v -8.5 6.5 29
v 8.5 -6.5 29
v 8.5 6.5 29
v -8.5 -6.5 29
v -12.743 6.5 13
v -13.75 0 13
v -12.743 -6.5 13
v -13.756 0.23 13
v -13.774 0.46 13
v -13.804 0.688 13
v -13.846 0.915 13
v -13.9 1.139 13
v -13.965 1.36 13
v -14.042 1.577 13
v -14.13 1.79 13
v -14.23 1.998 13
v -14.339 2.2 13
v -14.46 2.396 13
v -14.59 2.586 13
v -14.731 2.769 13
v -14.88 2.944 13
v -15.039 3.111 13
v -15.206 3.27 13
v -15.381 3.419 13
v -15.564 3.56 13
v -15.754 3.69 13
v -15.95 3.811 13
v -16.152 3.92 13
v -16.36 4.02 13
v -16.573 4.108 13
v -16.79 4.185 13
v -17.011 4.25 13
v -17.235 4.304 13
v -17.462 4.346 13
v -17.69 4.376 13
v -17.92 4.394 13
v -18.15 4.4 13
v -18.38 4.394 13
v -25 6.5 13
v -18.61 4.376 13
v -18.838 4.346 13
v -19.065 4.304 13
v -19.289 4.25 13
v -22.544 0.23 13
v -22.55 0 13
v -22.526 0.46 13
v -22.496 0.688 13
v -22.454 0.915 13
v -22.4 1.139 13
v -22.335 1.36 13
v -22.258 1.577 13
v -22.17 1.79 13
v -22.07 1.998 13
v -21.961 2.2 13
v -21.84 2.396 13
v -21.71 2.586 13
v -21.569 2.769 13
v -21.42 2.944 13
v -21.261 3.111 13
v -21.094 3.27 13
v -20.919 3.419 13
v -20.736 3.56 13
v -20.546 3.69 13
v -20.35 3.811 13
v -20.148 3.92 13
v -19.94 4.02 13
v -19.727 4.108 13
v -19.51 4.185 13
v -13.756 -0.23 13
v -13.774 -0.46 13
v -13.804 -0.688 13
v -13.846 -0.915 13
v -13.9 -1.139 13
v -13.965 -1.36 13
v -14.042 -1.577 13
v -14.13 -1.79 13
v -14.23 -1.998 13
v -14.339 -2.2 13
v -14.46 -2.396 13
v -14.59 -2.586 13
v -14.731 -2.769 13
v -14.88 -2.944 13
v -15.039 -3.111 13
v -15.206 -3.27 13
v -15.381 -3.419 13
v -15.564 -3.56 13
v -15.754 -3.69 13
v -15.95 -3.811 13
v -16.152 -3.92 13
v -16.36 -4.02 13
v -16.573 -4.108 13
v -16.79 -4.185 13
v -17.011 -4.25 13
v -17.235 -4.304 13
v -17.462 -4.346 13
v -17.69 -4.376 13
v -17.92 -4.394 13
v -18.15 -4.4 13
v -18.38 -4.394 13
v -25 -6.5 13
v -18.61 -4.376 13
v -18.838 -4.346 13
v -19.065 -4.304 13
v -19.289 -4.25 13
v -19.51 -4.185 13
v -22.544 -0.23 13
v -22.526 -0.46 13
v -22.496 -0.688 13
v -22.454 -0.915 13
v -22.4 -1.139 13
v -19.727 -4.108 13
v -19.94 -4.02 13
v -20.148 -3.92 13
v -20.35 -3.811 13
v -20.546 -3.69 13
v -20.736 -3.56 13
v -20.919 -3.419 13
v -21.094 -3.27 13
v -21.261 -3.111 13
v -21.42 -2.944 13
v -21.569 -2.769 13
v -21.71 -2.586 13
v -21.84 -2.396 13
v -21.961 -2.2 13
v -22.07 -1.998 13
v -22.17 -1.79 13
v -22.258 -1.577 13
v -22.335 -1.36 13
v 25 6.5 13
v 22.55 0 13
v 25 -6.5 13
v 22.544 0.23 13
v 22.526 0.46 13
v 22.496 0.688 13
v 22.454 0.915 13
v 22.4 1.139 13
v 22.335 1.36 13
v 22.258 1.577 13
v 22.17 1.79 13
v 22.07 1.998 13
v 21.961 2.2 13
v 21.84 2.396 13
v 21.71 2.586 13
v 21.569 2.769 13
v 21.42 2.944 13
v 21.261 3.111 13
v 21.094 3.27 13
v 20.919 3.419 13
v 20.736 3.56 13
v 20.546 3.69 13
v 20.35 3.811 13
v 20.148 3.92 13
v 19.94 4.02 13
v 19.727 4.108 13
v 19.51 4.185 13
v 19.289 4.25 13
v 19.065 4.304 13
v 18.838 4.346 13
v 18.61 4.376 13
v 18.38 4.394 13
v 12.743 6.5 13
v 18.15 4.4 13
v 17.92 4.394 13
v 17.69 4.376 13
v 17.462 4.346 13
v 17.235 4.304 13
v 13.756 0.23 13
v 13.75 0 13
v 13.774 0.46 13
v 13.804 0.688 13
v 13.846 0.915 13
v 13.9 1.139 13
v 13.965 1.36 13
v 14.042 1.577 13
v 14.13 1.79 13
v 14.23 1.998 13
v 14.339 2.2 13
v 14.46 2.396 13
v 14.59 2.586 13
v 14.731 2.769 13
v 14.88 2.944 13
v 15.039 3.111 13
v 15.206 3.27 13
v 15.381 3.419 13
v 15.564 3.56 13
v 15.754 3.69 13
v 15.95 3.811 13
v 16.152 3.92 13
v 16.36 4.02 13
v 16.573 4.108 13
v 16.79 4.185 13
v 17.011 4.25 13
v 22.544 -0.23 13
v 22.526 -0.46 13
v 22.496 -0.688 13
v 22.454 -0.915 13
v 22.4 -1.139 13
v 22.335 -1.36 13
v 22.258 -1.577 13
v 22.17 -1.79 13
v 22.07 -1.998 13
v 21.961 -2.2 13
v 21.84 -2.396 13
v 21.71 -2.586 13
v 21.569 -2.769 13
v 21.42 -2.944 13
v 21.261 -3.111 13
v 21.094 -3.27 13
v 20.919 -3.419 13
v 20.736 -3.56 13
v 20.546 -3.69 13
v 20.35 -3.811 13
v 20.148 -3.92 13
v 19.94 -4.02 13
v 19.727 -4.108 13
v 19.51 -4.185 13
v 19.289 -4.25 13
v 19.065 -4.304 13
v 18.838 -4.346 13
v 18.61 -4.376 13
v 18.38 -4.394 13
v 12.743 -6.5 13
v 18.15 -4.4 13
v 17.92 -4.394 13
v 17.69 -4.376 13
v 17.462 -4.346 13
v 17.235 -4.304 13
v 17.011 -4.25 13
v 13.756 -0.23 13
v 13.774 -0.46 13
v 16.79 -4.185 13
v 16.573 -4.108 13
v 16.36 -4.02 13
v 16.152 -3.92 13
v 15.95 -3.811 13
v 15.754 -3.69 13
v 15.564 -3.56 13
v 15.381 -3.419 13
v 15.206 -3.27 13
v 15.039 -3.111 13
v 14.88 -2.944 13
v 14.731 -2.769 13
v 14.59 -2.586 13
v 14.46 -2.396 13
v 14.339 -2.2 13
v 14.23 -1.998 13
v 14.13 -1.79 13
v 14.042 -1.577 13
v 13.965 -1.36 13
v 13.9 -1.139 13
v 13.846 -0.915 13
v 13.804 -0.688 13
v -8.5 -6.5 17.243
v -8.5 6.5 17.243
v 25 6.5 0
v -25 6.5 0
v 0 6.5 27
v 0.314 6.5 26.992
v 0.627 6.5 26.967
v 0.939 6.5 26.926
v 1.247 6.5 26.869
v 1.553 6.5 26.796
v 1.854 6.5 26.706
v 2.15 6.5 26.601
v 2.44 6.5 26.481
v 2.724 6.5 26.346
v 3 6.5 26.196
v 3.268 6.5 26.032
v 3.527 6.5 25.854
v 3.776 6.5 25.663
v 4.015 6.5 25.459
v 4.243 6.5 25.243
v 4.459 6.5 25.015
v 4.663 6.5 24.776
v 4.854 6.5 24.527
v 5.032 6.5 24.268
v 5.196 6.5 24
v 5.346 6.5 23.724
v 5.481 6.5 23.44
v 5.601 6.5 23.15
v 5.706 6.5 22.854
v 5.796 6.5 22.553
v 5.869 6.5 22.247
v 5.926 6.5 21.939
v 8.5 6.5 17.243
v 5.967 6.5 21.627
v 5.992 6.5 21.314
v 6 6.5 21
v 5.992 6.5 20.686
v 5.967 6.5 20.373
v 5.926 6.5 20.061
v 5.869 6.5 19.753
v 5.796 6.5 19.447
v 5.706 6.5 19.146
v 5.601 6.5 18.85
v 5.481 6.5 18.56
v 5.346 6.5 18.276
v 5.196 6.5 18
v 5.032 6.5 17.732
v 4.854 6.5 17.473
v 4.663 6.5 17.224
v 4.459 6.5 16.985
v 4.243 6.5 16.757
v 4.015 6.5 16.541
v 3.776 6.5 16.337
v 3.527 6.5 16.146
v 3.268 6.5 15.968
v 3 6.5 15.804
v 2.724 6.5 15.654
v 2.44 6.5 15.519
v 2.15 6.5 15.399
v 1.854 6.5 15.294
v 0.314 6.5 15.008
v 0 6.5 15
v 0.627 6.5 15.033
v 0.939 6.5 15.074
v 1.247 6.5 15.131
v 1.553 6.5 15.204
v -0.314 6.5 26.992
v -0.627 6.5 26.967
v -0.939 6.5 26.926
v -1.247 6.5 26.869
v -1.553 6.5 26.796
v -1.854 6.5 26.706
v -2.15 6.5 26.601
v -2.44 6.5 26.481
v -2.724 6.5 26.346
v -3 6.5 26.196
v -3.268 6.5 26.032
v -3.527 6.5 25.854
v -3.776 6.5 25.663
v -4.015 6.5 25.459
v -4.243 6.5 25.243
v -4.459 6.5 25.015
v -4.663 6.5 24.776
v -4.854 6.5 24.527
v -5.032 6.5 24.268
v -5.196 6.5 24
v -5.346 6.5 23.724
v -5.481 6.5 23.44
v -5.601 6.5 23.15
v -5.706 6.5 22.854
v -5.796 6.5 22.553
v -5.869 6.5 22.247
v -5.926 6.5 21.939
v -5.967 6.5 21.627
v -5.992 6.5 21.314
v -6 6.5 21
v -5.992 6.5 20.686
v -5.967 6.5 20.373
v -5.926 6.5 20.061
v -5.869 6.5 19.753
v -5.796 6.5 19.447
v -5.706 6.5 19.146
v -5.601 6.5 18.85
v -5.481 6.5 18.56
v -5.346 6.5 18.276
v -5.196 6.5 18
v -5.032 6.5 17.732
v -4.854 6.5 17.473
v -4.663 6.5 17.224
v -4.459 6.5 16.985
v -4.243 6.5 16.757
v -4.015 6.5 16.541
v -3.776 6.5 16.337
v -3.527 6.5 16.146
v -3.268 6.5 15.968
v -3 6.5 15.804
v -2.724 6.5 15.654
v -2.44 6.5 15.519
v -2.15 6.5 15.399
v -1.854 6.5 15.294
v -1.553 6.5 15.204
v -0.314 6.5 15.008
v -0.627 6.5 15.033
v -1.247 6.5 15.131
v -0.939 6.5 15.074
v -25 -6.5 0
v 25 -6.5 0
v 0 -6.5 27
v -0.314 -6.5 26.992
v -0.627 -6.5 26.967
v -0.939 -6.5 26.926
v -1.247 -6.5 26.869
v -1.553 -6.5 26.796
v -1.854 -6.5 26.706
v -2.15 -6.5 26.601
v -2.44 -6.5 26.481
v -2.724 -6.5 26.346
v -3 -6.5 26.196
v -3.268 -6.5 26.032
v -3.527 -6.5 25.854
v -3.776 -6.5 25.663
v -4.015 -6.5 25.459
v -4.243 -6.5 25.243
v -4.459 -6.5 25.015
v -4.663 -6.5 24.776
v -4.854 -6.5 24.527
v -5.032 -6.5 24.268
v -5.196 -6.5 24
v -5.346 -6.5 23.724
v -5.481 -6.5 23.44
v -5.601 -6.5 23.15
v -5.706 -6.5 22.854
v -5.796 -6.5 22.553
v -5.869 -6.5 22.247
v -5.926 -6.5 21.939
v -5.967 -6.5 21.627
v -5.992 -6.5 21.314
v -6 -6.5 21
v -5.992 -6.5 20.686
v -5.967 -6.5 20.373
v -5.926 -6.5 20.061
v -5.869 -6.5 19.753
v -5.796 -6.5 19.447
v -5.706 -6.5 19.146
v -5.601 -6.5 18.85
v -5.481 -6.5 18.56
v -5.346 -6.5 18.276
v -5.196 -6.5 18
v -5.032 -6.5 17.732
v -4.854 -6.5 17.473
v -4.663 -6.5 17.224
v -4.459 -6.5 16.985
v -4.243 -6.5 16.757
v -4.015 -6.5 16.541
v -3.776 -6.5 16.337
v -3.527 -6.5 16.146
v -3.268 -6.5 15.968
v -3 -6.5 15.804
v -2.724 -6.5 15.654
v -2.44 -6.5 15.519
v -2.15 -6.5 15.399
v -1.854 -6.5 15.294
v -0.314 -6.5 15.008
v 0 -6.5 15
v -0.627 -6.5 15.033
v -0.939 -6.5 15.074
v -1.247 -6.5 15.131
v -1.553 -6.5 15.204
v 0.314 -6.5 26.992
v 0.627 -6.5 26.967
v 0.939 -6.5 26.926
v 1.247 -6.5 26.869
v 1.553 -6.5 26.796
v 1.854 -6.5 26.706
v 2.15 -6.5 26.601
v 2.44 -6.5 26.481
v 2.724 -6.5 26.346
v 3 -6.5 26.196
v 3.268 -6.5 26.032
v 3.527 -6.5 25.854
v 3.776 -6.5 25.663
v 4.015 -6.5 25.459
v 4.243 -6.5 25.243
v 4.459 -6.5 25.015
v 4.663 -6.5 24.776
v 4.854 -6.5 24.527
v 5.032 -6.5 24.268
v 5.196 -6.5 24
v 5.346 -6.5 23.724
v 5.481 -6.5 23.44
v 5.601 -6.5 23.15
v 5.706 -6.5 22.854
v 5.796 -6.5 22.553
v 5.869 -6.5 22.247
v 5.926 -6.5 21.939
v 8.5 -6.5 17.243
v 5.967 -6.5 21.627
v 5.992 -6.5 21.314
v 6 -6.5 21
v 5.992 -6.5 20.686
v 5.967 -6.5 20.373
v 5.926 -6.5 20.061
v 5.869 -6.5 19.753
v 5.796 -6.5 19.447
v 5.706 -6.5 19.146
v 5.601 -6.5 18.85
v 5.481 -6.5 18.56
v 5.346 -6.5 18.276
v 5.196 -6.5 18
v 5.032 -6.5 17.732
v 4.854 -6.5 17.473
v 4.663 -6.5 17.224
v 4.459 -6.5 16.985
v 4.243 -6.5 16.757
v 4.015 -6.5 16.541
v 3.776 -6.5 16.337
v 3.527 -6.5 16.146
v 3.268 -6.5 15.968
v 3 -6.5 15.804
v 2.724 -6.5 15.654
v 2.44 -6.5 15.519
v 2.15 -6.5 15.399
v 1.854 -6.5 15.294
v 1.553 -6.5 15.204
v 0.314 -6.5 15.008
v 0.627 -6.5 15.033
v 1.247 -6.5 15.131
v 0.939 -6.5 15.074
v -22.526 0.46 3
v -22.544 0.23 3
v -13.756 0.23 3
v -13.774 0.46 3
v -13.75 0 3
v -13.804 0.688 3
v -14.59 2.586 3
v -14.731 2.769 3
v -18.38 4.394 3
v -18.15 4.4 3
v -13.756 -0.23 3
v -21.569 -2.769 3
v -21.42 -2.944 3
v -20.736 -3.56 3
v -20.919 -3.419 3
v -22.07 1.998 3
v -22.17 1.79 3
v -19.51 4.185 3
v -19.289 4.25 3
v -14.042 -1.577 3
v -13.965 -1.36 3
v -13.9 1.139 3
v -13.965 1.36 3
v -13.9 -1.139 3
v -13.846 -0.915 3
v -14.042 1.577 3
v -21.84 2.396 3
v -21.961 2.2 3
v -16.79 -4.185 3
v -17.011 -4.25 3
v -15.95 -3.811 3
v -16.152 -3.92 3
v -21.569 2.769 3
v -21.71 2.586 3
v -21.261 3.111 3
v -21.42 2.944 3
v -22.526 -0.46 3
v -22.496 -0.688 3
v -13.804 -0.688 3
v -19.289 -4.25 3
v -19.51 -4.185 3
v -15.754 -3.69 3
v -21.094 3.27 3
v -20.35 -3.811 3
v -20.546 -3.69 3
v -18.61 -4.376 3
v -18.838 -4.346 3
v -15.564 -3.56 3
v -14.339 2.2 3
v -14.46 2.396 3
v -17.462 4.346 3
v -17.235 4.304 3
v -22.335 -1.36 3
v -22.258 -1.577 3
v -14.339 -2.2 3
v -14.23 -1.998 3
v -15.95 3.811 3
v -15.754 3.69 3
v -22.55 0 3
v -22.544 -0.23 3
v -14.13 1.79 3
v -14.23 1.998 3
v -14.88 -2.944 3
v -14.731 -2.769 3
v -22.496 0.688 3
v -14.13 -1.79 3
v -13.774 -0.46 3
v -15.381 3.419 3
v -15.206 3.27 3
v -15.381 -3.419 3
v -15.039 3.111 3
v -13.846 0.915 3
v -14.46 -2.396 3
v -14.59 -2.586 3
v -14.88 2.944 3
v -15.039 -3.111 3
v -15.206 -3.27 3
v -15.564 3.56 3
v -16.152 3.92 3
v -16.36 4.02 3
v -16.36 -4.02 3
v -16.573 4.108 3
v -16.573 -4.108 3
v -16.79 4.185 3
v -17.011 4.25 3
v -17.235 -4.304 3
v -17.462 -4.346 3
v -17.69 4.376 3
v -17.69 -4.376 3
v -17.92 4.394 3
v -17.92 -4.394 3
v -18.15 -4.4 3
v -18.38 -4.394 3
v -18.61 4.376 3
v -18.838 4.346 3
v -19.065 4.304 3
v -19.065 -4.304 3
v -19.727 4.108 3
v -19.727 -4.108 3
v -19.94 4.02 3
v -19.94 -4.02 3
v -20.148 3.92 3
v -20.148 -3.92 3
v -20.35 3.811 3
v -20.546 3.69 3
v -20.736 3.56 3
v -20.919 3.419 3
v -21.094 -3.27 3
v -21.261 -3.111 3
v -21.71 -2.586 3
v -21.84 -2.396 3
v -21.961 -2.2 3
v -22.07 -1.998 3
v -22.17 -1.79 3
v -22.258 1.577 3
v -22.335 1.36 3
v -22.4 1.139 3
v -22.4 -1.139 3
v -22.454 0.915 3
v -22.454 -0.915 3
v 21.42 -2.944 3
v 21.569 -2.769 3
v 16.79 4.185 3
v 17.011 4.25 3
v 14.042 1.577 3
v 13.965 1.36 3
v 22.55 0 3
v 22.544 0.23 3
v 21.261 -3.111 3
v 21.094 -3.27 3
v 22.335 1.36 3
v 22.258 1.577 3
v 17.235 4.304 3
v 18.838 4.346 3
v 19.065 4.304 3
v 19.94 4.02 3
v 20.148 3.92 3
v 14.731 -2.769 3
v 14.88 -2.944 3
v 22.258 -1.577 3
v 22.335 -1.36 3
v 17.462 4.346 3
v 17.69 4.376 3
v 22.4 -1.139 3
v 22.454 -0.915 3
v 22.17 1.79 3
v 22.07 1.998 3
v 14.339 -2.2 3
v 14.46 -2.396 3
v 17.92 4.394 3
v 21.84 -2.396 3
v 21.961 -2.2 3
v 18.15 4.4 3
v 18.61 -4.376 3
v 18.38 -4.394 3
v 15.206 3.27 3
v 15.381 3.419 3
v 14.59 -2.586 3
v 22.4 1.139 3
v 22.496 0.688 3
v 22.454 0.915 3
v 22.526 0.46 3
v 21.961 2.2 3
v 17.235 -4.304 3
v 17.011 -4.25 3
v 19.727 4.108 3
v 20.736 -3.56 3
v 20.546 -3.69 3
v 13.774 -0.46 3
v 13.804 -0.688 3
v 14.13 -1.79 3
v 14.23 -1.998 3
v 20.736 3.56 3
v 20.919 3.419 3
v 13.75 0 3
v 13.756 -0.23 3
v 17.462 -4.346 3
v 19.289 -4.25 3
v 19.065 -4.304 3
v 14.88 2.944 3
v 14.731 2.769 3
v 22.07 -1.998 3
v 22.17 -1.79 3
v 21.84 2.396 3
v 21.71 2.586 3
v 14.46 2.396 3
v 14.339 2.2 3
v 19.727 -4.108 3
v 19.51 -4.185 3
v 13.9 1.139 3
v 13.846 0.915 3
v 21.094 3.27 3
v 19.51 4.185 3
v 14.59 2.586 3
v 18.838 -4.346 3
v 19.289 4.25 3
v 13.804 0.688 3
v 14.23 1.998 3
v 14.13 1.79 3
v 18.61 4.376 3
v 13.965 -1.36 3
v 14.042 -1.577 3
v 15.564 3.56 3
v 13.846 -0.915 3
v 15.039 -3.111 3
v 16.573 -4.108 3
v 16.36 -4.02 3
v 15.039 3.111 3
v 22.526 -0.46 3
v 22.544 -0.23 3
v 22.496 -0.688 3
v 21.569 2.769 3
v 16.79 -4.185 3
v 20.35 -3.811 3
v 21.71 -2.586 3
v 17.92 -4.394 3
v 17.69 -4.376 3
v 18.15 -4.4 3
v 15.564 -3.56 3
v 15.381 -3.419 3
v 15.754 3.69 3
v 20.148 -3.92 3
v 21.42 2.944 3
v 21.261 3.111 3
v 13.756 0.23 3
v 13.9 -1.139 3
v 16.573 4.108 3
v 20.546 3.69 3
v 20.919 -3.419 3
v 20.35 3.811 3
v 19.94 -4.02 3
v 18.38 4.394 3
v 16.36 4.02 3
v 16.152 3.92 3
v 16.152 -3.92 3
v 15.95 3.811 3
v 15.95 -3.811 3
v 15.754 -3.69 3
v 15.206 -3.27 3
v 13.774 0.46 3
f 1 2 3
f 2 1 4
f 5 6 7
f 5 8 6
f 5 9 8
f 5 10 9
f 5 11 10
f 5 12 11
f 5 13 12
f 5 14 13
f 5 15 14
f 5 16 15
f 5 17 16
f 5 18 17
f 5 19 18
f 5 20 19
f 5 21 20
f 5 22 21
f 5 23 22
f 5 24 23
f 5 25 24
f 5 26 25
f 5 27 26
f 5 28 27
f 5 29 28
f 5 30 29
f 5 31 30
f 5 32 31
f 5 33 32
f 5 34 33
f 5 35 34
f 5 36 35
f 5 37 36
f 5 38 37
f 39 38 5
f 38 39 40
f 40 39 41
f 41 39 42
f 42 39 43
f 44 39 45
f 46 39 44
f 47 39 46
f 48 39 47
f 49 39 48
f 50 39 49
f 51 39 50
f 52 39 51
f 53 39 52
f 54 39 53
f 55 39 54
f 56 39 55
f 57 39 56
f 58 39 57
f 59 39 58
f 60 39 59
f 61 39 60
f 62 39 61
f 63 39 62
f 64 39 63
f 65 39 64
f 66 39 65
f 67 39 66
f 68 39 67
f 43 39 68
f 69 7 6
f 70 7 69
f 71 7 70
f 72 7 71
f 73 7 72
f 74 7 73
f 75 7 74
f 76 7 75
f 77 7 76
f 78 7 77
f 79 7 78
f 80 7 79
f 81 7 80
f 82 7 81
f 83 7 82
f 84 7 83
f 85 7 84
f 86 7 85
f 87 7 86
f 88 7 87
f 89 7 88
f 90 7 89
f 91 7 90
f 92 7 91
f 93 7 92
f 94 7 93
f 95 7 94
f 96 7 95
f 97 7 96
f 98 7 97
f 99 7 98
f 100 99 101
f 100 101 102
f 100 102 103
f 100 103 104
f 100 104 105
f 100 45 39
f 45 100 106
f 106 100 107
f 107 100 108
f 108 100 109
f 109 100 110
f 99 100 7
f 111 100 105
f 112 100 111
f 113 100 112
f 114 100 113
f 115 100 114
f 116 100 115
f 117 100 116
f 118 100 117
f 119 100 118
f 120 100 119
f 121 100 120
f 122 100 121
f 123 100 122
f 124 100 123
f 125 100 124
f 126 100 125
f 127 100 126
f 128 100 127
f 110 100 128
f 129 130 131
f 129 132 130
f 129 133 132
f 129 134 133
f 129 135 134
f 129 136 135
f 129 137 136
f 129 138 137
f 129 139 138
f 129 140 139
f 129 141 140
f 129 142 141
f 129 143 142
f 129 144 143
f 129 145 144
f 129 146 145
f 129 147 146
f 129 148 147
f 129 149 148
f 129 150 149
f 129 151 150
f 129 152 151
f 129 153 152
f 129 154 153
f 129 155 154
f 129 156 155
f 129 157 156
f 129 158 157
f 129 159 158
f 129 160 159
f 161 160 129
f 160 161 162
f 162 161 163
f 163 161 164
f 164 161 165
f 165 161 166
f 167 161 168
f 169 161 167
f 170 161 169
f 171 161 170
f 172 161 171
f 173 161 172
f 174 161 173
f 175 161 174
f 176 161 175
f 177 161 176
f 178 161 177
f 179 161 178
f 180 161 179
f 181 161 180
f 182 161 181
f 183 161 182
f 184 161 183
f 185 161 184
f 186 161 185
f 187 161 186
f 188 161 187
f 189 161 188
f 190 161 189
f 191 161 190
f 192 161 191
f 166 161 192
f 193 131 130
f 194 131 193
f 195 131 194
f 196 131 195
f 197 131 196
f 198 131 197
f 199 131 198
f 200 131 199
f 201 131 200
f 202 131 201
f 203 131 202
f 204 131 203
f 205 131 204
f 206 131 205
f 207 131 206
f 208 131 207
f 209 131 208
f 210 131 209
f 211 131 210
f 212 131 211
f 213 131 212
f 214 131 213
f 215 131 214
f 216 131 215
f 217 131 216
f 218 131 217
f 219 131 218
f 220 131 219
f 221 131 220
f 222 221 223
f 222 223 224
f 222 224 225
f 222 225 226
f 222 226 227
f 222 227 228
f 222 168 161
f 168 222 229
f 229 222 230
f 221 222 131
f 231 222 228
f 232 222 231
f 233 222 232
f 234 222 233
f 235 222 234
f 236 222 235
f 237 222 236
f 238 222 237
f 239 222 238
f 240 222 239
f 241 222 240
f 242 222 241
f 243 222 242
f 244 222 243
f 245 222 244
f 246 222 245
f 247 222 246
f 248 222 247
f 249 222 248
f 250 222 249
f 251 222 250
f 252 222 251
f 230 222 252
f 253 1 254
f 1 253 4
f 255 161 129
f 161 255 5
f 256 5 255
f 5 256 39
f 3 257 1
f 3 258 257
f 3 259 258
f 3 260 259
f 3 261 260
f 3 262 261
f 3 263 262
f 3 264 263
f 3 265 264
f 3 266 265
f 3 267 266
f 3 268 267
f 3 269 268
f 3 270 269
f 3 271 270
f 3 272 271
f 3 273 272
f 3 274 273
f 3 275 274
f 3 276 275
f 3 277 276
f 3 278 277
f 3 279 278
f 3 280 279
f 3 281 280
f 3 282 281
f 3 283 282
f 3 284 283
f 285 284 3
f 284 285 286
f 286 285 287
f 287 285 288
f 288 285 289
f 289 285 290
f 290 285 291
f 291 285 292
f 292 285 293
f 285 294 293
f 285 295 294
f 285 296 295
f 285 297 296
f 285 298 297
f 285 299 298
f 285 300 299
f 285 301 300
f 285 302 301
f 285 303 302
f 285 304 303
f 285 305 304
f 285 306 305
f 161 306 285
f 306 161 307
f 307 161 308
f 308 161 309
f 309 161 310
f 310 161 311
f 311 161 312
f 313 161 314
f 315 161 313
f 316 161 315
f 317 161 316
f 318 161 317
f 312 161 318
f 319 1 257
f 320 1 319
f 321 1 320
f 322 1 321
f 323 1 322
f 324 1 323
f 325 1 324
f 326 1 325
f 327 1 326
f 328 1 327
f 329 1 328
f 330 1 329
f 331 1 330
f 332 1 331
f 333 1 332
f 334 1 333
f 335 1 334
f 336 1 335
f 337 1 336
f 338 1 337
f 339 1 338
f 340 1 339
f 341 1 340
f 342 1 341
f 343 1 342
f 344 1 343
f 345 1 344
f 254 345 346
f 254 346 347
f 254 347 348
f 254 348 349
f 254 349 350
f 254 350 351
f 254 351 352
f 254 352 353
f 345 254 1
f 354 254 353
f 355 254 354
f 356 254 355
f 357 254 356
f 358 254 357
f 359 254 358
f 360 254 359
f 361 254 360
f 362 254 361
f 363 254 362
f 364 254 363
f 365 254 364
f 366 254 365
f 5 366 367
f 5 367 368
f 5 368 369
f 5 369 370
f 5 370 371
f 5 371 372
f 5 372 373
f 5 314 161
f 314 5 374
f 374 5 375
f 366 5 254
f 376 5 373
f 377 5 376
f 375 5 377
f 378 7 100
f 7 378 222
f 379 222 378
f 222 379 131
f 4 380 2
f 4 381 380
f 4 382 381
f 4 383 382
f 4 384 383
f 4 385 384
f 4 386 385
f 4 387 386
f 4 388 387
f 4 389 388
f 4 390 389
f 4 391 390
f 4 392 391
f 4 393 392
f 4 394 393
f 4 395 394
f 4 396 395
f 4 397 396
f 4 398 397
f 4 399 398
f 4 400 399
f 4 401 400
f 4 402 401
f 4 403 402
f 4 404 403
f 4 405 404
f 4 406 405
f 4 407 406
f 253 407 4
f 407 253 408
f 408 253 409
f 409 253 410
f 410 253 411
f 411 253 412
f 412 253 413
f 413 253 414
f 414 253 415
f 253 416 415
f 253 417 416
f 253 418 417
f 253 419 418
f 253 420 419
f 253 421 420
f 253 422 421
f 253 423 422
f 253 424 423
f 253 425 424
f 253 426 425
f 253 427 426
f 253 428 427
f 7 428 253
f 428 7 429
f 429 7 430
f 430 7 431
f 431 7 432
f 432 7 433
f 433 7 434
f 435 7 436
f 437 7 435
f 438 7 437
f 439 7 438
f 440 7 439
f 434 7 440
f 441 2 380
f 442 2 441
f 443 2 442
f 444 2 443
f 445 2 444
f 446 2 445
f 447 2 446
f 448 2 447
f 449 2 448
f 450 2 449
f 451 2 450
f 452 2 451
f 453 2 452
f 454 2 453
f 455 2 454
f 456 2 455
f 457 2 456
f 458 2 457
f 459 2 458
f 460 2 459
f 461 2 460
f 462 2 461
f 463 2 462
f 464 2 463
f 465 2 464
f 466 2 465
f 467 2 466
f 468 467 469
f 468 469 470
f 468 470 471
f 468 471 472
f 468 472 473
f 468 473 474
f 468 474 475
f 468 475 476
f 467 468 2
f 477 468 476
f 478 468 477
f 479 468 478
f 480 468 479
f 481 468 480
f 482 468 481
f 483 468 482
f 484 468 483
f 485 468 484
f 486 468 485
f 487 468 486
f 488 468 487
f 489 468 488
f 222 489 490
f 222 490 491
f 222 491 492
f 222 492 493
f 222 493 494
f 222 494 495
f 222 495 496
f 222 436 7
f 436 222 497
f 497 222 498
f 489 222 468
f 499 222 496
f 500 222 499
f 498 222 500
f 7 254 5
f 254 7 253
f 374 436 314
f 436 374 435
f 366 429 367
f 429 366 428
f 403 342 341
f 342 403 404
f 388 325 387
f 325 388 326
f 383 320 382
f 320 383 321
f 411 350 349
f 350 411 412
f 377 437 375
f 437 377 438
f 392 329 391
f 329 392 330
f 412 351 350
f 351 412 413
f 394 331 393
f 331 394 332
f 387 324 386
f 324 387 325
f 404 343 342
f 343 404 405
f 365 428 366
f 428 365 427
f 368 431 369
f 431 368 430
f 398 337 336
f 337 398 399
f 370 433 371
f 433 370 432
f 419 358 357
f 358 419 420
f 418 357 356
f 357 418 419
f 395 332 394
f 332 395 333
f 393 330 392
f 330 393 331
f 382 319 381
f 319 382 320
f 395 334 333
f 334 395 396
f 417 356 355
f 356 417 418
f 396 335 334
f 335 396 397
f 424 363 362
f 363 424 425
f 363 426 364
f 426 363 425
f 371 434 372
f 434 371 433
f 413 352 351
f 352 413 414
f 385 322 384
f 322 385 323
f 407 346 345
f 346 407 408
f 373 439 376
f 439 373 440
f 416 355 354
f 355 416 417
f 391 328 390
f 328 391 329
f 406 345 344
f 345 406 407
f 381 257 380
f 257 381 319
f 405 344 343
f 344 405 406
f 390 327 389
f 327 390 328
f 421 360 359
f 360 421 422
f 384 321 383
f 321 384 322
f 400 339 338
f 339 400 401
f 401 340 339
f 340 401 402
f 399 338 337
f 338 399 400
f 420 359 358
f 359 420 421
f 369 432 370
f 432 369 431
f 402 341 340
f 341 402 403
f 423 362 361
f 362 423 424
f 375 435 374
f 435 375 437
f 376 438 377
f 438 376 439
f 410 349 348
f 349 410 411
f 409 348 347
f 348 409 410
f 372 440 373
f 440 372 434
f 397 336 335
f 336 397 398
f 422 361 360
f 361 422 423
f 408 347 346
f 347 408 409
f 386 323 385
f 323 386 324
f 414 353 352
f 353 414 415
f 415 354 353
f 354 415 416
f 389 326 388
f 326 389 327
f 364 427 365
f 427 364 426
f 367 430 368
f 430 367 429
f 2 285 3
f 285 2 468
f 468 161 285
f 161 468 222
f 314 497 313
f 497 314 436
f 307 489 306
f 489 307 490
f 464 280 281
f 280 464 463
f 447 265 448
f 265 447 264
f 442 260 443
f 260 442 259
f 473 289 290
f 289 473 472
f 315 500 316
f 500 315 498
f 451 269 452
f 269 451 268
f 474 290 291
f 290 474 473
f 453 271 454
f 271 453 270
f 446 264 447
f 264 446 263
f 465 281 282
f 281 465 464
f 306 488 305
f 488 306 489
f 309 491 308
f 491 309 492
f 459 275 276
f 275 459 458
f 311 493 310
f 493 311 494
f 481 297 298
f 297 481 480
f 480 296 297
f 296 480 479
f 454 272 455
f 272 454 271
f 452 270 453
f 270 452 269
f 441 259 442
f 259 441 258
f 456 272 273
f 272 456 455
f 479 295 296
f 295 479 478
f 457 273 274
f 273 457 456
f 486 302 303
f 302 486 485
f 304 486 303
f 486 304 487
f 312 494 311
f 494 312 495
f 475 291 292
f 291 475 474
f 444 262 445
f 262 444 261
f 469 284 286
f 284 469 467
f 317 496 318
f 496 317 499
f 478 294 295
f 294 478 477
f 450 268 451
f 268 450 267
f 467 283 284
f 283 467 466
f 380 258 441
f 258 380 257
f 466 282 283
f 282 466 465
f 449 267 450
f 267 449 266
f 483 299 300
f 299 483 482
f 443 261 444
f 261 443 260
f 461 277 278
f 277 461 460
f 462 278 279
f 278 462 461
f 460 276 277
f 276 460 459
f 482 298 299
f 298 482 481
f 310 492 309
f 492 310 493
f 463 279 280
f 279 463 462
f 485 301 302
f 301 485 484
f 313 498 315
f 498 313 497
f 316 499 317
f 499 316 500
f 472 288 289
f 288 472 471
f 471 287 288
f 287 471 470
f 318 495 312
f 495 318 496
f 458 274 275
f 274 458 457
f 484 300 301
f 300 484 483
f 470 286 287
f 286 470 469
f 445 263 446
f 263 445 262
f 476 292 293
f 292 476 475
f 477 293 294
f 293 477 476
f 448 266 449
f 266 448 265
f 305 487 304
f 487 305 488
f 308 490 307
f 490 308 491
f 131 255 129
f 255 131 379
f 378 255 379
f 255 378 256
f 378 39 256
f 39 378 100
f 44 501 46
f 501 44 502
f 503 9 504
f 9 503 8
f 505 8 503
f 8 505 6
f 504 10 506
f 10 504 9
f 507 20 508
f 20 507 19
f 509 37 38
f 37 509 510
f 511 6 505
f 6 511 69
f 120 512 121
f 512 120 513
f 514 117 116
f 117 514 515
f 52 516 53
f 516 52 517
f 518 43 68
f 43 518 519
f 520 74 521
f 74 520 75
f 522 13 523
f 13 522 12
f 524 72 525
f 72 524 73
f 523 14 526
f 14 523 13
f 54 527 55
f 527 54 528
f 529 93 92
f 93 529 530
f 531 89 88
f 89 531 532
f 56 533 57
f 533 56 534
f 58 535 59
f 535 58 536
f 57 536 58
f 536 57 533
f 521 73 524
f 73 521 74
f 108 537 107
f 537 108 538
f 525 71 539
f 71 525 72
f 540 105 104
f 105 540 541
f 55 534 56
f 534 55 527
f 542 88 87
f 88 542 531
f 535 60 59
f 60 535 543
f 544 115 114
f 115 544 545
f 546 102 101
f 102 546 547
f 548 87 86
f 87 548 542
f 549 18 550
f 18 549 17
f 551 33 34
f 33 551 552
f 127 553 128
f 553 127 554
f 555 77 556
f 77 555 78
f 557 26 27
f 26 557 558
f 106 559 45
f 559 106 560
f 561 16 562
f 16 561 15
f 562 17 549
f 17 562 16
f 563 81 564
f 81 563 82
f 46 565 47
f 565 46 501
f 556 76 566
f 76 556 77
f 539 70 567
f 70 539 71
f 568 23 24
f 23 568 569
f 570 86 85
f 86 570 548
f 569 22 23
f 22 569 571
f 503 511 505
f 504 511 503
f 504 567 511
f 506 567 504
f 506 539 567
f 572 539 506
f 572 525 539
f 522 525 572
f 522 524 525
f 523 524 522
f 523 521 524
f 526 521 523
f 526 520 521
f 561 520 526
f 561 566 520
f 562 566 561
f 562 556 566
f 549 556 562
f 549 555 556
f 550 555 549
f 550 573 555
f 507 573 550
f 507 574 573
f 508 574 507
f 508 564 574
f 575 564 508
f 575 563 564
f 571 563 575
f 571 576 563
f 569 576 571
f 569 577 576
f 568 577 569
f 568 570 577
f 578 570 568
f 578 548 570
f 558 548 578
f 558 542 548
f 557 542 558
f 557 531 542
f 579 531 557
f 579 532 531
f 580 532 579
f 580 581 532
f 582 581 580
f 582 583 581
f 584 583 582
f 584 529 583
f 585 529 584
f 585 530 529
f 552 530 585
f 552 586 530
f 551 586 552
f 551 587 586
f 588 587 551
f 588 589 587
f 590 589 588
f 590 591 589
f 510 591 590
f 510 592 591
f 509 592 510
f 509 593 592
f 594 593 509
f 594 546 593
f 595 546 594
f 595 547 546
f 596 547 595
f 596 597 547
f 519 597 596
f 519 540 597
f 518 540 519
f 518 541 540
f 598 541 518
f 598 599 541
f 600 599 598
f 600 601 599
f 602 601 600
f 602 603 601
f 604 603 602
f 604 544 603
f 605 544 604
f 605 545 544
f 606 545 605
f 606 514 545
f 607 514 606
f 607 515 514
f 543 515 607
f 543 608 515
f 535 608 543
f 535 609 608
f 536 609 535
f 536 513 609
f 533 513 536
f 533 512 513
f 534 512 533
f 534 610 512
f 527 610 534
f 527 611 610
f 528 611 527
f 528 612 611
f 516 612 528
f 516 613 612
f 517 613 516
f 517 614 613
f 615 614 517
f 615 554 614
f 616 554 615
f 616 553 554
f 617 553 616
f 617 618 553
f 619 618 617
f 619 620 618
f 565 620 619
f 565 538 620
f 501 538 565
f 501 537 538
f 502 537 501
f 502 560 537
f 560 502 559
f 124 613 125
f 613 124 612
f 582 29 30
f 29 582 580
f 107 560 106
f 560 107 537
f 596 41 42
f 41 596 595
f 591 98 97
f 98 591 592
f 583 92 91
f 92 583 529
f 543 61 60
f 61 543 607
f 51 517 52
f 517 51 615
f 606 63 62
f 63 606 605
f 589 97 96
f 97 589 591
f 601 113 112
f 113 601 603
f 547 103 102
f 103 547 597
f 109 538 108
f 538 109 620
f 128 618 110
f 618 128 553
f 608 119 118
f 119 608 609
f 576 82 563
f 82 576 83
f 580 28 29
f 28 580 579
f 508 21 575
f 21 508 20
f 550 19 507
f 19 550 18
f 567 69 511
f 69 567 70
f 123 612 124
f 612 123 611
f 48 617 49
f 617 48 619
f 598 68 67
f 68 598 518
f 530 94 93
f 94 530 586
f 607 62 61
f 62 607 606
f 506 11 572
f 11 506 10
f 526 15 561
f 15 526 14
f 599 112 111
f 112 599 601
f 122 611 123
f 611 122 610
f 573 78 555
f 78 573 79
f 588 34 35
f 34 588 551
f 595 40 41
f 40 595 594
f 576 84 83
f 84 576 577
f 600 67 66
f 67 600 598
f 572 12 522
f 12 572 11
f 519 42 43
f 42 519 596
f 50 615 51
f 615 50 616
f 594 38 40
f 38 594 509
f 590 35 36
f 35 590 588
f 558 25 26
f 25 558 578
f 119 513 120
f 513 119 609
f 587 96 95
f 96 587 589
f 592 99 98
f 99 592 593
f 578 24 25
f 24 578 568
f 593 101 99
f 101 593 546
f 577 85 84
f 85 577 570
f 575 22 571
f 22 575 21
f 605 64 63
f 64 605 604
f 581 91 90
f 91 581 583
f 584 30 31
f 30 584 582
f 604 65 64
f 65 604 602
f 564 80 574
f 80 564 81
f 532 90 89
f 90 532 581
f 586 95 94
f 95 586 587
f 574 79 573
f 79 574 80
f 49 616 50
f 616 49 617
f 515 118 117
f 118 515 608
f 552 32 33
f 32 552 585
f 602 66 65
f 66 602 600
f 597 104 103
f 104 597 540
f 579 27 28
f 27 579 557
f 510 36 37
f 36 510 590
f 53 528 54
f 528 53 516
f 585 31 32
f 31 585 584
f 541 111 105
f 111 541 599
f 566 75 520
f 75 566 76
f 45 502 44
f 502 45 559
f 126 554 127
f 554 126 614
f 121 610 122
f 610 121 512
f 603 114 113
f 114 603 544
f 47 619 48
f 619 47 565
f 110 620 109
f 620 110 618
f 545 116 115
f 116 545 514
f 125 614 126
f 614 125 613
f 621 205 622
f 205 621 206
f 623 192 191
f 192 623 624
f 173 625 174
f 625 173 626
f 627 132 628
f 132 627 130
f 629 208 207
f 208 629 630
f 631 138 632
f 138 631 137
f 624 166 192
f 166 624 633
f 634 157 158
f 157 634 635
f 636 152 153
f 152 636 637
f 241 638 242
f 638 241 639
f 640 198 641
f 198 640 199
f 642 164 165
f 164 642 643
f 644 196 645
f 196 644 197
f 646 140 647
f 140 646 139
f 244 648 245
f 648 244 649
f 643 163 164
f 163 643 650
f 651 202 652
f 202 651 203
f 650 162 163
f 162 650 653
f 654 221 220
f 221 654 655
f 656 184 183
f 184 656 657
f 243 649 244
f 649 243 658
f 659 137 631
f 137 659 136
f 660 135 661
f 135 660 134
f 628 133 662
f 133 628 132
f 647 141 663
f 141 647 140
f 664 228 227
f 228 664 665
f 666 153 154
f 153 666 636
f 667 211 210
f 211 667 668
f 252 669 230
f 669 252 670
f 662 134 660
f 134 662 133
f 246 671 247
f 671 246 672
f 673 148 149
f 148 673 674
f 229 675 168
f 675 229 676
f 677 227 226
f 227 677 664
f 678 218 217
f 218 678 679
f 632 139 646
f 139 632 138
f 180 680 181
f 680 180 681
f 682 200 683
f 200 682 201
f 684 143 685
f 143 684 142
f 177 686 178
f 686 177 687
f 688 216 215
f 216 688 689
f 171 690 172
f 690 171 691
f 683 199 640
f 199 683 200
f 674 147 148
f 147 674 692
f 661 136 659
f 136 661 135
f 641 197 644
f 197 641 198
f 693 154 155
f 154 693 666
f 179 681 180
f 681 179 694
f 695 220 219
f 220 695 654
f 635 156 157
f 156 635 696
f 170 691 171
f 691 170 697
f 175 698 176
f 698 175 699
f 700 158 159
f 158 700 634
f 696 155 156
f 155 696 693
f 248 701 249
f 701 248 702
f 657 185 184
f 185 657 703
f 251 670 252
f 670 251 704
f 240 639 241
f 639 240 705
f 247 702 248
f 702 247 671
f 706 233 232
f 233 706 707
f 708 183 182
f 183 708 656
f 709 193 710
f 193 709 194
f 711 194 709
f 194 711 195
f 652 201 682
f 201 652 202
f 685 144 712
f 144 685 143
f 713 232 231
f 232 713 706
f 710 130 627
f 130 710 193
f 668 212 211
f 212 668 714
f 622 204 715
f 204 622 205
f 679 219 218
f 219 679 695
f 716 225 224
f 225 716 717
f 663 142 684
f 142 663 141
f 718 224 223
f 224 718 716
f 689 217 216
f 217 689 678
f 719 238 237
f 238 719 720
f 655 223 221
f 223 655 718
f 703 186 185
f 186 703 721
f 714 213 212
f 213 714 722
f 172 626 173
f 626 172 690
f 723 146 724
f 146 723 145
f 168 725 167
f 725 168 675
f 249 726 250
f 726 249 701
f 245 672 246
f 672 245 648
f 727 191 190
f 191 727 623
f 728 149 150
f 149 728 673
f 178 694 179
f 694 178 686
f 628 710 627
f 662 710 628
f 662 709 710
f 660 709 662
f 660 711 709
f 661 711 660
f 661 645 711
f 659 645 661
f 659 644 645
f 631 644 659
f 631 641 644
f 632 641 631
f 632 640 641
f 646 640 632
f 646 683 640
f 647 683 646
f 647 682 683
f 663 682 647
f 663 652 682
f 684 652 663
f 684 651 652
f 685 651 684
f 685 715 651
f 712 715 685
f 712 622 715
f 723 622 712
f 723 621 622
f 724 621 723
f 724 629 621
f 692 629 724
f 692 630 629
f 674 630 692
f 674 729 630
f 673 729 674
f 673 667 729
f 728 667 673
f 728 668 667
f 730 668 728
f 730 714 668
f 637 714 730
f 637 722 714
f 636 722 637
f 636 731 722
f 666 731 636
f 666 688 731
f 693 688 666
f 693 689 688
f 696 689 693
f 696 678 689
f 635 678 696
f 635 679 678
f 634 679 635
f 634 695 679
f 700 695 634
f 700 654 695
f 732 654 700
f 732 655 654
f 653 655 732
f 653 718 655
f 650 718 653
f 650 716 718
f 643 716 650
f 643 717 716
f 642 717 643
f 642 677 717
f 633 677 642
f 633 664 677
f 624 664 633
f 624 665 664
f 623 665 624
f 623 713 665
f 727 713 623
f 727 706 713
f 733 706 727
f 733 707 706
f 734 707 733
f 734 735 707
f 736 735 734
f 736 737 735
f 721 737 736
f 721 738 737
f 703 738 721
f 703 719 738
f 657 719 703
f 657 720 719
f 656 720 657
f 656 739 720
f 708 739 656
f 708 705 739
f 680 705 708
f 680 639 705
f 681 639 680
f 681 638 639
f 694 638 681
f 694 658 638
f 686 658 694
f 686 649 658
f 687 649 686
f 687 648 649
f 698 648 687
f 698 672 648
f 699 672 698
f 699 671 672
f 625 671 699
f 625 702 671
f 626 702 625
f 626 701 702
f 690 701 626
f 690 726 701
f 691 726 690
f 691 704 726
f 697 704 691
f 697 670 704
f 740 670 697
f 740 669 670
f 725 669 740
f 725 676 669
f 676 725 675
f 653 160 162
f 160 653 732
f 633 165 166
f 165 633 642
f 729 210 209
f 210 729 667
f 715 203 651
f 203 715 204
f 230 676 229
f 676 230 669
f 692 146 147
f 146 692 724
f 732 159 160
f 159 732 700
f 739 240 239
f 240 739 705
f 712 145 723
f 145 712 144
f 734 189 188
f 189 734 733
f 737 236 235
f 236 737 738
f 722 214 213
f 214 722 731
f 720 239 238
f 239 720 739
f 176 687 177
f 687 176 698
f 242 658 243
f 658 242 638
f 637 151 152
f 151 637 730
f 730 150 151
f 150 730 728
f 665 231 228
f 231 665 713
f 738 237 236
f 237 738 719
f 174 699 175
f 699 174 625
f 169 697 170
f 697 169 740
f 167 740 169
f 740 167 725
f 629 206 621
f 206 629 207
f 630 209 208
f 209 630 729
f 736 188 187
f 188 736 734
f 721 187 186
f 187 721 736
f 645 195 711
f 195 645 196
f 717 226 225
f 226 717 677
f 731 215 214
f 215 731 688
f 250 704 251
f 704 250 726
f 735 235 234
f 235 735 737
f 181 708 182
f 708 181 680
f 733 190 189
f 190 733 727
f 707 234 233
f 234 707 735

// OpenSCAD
// Real Lonely T-Rex Game: Jump mechanism cap
// Copyright (C) 2017, Uri Shaked and Ariella Eliassaf

$fn=120;

pole_radius = 8/2;
pole_distance = 36.3;
width = 50;
depth = 13;
cap_tickness = 3;
hole_depth = 10;

module copy_mirror(vec=[0,1,0]) { 
    children(); 
    mirror(vec) children(); 
}

copy_mirror([1,0,0])
translate([-17/2, -depth/2,cap_tickness+hole_depth])
difference(){
   union() {
        cube([17/2, depth, 16]);

        translate([0,0,-6*sin(45)])
        rotate([0, -45, 0])
        cube([6, depth, 6]);
    }

    translate([8.5, 15, 8])
    rotate([90, 0, 0])
    cylinder(h = 32, r = 6);
};


difference() {
    translate([-width/2, -depth/2,0])
    cube([width, depth, cap_tickness+hole_depth]);
  
    translate([-pole_distance/2, 0, cap_tickness])
    cylinder(r=pole_radius+0.4, h=10);

    translate([pole_distance/2, 0, cap_tickness])
    cylinder(r=pole_radius+0.4, h=10);
}
